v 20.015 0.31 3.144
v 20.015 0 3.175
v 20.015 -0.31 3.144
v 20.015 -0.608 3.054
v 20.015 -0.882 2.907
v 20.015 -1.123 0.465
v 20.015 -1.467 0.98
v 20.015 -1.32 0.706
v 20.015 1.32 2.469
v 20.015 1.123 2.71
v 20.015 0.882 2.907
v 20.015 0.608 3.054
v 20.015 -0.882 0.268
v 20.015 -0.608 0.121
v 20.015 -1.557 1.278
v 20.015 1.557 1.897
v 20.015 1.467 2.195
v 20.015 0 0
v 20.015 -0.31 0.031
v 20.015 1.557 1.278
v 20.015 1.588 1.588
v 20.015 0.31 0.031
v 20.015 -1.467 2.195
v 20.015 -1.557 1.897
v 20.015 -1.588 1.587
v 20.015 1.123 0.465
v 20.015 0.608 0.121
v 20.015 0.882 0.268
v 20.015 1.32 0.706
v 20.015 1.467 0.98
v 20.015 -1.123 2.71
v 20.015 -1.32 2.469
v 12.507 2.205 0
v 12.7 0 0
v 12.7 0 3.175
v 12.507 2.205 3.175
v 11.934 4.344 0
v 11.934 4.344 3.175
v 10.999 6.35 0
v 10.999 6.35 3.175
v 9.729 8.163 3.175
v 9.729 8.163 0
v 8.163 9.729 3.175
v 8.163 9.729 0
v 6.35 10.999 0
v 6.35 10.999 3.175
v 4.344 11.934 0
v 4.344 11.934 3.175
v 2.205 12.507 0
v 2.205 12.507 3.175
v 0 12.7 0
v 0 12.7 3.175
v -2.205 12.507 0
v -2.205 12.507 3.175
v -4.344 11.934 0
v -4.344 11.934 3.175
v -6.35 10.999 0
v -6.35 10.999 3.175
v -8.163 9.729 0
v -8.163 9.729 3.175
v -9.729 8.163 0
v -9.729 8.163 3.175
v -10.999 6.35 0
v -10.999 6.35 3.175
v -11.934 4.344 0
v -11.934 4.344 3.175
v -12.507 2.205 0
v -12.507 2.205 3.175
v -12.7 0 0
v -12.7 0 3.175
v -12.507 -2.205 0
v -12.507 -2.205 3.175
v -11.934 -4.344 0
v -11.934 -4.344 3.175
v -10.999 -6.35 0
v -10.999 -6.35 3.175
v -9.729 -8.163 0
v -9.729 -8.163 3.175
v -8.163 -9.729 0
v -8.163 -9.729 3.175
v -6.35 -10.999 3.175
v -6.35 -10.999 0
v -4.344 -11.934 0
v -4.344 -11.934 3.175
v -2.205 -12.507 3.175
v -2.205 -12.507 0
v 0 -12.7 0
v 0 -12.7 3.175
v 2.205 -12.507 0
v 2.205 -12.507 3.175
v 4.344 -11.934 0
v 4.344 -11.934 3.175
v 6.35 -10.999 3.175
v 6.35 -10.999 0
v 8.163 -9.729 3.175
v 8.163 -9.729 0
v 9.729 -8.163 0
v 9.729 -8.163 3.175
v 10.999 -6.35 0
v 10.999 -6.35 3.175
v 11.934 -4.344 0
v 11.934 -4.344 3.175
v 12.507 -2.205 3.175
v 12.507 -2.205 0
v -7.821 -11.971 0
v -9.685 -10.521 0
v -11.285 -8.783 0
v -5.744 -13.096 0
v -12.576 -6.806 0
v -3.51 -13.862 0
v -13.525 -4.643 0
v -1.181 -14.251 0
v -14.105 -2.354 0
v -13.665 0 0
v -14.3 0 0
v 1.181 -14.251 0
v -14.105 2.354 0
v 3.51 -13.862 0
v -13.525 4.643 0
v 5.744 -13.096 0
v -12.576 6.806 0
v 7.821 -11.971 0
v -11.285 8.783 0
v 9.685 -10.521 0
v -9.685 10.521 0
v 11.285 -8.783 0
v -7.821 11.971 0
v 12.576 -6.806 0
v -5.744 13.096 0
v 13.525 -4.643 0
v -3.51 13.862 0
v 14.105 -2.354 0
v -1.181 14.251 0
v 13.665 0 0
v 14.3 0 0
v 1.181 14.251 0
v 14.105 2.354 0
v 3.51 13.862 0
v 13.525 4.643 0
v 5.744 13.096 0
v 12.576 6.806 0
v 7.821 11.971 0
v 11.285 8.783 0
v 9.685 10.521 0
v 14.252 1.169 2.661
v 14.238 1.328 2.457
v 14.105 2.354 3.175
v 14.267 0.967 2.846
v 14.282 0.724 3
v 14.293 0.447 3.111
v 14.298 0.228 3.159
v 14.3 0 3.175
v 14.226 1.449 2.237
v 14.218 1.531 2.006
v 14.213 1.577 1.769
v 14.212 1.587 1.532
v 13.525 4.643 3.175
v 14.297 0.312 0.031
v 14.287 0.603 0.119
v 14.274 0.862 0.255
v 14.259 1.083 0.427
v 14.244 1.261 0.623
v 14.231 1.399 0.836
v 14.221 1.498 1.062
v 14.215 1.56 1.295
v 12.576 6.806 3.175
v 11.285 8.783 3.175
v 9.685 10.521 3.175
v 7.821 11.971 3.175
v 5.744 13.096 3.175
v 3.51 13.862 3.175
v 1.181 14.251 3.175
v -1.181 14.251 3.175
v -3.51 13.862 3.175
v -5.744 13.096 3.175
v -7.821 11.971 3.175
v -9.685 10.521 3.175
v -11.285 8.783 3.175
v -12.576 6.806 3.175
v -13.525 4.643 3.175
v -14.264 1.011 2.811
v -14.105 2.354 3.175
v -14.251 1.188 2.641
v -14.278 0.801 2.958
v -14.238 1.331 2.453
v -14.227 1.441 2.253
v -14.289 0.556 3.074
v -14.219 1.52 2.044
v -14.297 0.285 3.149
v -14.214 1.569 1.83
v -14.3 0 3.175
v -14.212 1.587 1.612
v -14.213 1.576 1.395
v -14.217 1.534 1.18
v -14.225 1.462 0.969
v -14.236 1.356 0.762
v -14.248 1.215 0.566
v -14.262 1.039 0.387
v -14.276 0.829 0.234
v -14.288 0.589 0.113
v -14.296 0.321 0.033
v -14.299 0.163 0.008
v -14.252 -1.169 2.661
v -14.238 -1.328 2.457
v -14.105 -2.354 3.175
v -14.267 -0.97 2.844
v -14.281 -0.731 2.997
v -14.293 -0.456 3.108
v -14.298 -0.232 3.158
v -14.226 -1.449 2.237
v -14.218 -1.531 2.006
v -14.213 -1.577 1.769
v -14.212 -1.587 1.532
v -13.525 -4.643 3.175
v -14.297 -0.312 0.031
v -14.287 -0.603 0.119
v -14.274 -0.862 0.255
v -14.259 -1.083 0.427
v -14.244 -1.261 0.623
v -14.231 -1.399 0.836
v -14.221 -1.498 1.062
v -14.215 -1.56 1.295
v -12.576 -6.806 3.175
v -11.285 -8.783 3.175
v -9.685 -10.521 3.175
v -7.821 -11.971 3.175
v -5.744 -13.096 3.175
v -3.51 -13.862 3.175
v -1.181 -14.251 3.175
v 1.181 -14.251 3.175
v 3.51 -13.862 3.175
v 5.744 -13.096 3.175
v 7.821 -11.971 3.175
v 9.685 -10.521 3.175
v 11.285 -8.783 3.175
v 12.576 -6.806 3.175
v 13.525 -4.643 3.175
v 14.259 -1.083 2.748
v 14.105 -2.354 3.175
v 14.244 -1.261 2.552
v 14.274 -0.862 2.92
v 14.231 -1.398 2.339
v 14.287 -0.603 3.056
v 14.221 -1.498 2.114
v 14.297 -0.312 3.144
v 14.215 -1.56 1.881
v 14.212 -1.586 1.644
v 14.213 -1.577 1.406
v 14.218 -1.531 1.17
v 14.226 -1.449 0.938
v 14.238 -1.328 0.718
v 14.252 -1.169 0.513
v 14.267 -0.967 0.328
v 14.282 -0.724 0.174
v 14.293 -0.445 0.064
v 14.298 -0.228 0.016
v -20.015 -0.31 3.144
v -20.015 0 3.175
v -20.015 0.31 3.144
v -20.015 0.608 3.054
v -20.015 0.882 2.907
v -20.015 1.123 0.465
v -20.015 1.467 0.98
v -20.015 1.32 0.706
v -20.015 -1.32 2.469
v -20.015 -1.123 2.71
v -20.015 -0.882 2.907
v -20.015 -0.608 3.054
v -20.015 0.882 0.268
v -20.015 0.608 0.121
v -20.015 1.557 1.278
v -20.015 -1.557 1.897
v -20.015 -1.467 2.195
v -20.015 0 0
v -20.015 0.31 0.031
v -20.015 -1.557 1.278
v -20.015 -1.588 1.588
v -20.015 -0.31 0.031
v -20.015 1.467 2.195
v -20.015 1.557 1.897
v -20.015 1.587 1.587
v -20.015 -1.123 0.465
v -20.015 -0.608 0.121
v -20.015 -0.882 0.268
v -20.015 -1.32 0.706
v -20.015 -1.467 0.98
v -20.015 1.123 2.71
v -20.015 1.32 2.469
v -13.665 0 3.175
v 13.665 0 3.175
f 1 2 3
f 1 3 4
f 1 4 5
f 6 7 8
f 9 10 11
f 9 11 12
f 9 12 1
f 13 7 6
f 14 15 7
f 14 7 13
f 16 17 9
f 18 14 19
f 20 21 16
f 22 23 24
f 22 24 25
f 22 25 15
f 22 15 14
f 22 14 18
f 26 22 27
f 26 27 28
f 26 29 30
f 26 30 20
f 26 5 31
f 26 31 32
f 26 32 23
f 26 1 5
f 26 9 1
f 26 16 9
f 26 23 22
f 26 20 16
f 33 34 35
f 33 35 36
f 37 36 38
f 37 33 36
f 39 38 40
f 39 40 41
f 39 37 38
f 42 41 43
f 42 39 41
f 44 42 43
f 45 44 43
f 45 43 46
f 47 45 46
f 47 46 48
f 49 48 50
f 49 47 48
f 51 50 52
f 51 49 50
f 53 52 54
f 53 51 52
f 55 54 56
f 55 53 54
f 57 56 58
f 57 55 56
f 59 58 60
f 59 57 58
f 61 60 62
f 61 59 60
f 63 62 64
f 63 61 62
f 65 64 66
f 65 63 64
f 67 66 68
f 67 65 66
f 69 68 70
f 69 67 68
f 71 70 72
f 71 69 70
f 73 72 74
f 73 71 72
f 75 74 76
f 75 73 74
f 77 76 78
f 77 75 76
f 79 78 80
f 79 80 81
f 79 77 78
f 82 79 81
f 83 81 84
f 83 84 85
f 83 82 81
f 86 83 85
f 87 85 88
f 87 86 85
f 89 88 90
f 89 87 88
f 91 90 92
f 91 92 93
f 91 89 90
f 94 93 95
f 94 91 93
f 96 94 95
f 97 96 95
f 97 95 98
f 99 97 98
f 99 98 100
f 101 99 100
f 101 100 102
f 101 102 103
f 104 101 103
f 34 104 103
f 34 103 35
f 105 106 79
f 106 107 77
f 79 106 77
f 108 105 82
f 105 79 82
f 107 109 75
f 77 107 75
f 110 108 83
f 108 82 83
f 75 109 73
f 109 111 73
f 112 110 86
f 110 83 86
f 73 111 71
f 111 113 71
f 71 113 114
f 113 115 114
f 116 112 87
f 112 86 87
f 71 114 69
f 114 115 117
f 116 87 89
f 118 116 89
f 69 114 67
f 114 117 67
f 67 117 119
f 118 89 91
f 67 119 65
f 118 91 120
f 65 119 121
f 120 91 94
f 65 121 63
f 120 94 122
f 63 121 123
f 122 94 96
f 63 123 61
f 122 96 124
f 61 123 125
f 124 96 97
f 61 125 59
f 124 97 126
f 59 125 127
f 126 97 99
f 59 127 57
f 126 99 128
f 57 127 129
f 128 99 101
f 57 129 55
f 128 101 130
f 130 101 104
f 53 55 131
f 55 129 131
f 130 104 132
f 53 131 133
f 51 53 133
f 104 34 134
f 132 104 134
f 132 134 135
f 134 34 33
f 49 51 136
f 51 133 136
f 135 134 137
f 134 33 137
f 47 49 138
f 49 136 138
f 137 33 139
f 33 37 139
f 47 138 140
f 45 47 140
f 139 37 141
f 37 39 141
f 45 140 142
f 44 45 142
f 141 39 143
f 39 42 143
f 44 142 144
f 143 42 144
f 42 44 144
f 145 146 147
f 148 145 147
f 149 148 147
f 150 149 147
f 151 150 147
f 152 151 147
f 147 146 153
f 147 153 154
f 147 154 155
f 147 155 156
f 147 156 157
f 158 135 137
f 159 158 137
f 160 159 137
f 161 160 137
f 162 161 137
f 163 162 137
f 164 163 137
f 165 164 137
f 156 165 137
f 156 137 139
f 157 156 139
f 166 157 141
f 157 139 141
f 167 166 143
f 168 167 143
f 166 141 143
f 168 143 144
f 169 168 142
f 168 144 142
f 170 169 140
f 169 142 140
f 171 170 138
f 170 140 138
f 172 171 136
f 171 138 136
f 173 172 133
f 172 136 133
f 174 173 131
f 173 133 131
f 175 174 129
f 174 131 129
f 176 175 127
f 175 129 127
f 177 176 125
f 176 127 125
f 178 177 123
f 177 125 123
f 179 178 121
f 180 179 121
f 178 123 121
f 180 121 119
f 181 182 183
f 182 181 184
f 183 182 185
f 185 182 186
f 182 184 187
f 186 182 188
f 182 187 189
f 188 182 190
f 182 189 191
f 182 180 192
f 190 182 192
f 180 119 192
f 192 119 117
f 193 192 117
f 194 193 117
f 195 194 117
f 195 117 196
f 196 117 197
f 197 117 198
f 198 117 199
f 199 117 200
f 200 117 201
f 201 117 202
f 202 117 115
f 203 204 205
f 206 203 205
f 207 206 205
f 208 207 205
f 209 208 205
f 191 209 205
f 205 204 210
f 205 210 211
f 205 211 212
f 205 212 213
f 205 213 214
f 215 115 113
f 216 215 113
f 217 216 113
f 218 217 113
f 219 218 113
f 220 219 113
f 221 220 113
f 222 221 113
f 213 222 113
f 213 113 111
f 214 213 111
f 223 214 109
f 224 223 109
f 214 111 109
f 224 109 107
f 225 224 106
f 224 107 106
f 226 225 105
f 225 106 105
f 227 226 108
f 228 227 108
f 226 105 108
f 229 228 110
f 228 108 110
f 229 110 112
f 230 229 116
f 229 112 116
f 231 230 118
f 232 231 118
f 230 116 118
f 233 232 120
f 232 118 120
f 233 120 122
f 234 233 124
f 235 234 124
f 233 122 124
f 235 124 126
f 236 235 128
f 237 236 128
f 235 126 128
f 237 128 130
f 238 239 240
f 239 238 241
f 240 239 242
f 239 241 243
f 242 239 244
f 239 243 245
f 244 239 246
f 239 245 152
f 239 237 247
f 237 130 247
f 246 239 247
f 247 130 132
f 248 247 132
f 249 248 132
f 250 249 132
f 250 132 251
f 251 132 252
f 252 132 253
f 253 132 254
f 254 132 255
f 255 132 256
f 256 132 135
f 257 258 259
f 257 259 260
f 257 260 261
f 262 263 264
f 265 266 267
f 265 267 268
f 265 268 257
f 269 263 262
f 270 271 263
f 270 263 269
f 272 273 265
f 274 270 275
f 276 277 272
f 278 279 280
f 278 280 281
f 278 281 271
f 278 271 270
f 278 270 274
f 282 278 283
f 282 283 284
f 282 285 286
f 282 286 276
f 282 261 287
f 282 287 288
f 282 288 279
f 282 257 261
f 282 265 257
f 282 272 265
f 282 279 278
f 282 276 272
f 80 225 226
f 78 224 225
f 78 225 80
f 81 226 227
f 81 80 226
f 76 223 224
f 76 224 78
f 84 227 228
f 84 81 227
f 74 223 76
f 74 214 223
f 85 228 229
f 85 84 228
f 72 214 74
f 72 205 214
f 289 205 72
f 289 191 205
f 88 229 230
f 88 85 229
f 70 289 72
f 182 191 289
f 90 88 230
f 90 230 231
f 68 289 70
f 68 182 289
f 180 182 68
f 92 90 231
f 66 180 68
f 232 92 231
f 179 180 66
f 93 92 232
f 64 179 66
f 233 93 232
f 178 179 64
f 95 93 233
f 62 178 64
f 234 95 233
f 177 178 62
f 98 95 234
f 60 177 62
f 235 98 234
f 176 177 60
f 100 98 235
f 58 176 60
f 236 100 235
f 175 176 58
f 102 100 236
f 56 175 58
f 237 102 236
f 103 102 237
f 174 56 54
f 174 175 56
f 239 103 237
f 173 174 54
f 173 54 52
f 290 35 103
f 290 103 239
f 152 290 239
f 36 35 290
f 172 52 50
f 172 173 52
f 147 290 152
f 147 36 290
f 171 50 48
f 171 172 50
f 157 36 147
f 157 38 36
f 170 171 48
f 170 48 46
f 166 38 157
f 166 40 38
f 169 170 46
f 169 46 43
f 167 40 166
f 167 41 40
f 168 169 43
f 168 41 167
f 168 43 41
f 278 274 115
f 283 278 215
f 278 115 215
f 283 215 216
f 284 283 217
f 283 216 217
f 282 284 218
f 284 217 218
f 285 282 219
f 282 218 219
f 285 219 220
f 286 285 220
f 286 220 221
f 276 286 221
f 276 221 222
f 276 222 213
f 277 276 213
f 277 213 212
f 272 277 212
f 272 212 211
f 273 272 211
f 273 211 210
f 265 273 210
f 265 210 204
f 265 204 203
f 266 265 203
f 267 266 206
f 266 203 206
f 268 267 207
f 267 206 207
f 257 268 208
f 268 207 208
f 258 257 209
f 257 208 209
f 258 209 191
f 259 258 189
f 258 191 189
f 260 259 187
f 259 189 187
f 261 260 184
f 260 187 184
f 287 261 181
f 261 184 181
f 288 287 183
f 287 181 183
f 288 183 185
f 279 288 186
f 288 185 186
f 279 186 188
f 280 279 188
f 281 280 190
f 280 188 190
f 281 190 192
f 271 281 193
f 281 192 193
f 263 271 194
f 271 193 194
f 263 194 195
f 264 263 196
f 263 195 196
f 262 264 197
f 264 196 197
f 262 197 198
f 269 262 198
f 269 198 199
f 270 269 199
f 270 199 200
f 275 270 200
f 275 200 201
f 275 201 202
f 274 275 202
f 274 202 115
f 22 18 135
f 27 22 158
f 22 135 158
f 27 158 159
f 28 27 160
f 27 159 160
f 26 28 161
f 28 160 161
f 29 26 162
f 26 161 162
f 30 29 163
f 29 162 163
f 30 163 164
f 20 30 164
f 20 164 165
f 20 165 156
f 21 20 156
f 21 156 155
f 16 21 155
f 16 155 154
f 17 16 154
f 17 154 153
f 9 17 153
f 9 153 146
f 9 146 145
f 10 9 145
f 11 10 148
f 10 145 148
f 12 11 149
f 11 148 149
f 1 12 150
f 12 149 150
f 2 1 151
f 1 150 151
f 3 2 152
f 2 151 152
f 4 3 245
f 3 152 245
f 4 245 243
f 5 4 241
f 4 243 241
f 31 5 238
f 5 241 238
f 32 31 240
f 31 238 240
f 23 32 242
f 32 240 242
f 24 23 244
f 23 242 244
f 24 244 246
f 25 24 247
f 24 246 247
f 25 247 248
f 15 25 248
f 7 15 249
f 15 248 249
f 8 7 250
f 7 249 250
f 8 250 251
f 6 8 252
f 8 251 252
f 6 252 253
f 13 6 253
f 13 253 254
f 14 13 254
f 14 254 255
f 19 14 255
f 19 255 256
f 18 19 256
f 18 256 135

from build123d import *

# Parameters (mm, degrees)
SKETCH1_R           = 14.3
SKETCH1_R_2         = 12.7
BOSS_EXTRUDE1_DEPTH = 3.175
BOSS_EXTRUDE2_START = -0.635
SKETCH2_R           = 1.5875
BOSS_EXTRUDE2_DEPTH = 6.35
CIRPATTERN1_COUNT   = 2


with BuildPart() as part:
    # Sketch1 → Boss-Extrude1 (new body)
    with BuildSketch(Plane.XY):
        Circle(SKETCH1_R)
        Circle(SKETCH1_R_2, mode=Mode.SUBTRACT)
    extrude(amount=BOSS_EXTRUDE1_DEPTH)

    # Sketch2 → Boss-Extrude2 (add)
    with BuildSketch(Plane(origin=(14.3, 0, 0), x_dir=(0, 0, -1), z_dir=(1, 0, 0)).offset(BOSS_EXTRUDE2_START)):
        with Locations((-1.5875, 0)):
            Circle(SKETCH2_R)
    boss_extrude2 = extrude(amount=BOSS_EXTRUDE2_DEPTH)

    # CirPattern1: Boss-Extrude2 ×2 about axis
    cirpattern1_axis = Axis((0, 0, 3.175), (0, 0, -1))
    for i in range(1, CIRPATTERN1_COUNT):
        add(boss_extrude2.rotate(cirpattern1_axis, i * 360 / CIRPATTERN1_COUNT))


solid = part.part
